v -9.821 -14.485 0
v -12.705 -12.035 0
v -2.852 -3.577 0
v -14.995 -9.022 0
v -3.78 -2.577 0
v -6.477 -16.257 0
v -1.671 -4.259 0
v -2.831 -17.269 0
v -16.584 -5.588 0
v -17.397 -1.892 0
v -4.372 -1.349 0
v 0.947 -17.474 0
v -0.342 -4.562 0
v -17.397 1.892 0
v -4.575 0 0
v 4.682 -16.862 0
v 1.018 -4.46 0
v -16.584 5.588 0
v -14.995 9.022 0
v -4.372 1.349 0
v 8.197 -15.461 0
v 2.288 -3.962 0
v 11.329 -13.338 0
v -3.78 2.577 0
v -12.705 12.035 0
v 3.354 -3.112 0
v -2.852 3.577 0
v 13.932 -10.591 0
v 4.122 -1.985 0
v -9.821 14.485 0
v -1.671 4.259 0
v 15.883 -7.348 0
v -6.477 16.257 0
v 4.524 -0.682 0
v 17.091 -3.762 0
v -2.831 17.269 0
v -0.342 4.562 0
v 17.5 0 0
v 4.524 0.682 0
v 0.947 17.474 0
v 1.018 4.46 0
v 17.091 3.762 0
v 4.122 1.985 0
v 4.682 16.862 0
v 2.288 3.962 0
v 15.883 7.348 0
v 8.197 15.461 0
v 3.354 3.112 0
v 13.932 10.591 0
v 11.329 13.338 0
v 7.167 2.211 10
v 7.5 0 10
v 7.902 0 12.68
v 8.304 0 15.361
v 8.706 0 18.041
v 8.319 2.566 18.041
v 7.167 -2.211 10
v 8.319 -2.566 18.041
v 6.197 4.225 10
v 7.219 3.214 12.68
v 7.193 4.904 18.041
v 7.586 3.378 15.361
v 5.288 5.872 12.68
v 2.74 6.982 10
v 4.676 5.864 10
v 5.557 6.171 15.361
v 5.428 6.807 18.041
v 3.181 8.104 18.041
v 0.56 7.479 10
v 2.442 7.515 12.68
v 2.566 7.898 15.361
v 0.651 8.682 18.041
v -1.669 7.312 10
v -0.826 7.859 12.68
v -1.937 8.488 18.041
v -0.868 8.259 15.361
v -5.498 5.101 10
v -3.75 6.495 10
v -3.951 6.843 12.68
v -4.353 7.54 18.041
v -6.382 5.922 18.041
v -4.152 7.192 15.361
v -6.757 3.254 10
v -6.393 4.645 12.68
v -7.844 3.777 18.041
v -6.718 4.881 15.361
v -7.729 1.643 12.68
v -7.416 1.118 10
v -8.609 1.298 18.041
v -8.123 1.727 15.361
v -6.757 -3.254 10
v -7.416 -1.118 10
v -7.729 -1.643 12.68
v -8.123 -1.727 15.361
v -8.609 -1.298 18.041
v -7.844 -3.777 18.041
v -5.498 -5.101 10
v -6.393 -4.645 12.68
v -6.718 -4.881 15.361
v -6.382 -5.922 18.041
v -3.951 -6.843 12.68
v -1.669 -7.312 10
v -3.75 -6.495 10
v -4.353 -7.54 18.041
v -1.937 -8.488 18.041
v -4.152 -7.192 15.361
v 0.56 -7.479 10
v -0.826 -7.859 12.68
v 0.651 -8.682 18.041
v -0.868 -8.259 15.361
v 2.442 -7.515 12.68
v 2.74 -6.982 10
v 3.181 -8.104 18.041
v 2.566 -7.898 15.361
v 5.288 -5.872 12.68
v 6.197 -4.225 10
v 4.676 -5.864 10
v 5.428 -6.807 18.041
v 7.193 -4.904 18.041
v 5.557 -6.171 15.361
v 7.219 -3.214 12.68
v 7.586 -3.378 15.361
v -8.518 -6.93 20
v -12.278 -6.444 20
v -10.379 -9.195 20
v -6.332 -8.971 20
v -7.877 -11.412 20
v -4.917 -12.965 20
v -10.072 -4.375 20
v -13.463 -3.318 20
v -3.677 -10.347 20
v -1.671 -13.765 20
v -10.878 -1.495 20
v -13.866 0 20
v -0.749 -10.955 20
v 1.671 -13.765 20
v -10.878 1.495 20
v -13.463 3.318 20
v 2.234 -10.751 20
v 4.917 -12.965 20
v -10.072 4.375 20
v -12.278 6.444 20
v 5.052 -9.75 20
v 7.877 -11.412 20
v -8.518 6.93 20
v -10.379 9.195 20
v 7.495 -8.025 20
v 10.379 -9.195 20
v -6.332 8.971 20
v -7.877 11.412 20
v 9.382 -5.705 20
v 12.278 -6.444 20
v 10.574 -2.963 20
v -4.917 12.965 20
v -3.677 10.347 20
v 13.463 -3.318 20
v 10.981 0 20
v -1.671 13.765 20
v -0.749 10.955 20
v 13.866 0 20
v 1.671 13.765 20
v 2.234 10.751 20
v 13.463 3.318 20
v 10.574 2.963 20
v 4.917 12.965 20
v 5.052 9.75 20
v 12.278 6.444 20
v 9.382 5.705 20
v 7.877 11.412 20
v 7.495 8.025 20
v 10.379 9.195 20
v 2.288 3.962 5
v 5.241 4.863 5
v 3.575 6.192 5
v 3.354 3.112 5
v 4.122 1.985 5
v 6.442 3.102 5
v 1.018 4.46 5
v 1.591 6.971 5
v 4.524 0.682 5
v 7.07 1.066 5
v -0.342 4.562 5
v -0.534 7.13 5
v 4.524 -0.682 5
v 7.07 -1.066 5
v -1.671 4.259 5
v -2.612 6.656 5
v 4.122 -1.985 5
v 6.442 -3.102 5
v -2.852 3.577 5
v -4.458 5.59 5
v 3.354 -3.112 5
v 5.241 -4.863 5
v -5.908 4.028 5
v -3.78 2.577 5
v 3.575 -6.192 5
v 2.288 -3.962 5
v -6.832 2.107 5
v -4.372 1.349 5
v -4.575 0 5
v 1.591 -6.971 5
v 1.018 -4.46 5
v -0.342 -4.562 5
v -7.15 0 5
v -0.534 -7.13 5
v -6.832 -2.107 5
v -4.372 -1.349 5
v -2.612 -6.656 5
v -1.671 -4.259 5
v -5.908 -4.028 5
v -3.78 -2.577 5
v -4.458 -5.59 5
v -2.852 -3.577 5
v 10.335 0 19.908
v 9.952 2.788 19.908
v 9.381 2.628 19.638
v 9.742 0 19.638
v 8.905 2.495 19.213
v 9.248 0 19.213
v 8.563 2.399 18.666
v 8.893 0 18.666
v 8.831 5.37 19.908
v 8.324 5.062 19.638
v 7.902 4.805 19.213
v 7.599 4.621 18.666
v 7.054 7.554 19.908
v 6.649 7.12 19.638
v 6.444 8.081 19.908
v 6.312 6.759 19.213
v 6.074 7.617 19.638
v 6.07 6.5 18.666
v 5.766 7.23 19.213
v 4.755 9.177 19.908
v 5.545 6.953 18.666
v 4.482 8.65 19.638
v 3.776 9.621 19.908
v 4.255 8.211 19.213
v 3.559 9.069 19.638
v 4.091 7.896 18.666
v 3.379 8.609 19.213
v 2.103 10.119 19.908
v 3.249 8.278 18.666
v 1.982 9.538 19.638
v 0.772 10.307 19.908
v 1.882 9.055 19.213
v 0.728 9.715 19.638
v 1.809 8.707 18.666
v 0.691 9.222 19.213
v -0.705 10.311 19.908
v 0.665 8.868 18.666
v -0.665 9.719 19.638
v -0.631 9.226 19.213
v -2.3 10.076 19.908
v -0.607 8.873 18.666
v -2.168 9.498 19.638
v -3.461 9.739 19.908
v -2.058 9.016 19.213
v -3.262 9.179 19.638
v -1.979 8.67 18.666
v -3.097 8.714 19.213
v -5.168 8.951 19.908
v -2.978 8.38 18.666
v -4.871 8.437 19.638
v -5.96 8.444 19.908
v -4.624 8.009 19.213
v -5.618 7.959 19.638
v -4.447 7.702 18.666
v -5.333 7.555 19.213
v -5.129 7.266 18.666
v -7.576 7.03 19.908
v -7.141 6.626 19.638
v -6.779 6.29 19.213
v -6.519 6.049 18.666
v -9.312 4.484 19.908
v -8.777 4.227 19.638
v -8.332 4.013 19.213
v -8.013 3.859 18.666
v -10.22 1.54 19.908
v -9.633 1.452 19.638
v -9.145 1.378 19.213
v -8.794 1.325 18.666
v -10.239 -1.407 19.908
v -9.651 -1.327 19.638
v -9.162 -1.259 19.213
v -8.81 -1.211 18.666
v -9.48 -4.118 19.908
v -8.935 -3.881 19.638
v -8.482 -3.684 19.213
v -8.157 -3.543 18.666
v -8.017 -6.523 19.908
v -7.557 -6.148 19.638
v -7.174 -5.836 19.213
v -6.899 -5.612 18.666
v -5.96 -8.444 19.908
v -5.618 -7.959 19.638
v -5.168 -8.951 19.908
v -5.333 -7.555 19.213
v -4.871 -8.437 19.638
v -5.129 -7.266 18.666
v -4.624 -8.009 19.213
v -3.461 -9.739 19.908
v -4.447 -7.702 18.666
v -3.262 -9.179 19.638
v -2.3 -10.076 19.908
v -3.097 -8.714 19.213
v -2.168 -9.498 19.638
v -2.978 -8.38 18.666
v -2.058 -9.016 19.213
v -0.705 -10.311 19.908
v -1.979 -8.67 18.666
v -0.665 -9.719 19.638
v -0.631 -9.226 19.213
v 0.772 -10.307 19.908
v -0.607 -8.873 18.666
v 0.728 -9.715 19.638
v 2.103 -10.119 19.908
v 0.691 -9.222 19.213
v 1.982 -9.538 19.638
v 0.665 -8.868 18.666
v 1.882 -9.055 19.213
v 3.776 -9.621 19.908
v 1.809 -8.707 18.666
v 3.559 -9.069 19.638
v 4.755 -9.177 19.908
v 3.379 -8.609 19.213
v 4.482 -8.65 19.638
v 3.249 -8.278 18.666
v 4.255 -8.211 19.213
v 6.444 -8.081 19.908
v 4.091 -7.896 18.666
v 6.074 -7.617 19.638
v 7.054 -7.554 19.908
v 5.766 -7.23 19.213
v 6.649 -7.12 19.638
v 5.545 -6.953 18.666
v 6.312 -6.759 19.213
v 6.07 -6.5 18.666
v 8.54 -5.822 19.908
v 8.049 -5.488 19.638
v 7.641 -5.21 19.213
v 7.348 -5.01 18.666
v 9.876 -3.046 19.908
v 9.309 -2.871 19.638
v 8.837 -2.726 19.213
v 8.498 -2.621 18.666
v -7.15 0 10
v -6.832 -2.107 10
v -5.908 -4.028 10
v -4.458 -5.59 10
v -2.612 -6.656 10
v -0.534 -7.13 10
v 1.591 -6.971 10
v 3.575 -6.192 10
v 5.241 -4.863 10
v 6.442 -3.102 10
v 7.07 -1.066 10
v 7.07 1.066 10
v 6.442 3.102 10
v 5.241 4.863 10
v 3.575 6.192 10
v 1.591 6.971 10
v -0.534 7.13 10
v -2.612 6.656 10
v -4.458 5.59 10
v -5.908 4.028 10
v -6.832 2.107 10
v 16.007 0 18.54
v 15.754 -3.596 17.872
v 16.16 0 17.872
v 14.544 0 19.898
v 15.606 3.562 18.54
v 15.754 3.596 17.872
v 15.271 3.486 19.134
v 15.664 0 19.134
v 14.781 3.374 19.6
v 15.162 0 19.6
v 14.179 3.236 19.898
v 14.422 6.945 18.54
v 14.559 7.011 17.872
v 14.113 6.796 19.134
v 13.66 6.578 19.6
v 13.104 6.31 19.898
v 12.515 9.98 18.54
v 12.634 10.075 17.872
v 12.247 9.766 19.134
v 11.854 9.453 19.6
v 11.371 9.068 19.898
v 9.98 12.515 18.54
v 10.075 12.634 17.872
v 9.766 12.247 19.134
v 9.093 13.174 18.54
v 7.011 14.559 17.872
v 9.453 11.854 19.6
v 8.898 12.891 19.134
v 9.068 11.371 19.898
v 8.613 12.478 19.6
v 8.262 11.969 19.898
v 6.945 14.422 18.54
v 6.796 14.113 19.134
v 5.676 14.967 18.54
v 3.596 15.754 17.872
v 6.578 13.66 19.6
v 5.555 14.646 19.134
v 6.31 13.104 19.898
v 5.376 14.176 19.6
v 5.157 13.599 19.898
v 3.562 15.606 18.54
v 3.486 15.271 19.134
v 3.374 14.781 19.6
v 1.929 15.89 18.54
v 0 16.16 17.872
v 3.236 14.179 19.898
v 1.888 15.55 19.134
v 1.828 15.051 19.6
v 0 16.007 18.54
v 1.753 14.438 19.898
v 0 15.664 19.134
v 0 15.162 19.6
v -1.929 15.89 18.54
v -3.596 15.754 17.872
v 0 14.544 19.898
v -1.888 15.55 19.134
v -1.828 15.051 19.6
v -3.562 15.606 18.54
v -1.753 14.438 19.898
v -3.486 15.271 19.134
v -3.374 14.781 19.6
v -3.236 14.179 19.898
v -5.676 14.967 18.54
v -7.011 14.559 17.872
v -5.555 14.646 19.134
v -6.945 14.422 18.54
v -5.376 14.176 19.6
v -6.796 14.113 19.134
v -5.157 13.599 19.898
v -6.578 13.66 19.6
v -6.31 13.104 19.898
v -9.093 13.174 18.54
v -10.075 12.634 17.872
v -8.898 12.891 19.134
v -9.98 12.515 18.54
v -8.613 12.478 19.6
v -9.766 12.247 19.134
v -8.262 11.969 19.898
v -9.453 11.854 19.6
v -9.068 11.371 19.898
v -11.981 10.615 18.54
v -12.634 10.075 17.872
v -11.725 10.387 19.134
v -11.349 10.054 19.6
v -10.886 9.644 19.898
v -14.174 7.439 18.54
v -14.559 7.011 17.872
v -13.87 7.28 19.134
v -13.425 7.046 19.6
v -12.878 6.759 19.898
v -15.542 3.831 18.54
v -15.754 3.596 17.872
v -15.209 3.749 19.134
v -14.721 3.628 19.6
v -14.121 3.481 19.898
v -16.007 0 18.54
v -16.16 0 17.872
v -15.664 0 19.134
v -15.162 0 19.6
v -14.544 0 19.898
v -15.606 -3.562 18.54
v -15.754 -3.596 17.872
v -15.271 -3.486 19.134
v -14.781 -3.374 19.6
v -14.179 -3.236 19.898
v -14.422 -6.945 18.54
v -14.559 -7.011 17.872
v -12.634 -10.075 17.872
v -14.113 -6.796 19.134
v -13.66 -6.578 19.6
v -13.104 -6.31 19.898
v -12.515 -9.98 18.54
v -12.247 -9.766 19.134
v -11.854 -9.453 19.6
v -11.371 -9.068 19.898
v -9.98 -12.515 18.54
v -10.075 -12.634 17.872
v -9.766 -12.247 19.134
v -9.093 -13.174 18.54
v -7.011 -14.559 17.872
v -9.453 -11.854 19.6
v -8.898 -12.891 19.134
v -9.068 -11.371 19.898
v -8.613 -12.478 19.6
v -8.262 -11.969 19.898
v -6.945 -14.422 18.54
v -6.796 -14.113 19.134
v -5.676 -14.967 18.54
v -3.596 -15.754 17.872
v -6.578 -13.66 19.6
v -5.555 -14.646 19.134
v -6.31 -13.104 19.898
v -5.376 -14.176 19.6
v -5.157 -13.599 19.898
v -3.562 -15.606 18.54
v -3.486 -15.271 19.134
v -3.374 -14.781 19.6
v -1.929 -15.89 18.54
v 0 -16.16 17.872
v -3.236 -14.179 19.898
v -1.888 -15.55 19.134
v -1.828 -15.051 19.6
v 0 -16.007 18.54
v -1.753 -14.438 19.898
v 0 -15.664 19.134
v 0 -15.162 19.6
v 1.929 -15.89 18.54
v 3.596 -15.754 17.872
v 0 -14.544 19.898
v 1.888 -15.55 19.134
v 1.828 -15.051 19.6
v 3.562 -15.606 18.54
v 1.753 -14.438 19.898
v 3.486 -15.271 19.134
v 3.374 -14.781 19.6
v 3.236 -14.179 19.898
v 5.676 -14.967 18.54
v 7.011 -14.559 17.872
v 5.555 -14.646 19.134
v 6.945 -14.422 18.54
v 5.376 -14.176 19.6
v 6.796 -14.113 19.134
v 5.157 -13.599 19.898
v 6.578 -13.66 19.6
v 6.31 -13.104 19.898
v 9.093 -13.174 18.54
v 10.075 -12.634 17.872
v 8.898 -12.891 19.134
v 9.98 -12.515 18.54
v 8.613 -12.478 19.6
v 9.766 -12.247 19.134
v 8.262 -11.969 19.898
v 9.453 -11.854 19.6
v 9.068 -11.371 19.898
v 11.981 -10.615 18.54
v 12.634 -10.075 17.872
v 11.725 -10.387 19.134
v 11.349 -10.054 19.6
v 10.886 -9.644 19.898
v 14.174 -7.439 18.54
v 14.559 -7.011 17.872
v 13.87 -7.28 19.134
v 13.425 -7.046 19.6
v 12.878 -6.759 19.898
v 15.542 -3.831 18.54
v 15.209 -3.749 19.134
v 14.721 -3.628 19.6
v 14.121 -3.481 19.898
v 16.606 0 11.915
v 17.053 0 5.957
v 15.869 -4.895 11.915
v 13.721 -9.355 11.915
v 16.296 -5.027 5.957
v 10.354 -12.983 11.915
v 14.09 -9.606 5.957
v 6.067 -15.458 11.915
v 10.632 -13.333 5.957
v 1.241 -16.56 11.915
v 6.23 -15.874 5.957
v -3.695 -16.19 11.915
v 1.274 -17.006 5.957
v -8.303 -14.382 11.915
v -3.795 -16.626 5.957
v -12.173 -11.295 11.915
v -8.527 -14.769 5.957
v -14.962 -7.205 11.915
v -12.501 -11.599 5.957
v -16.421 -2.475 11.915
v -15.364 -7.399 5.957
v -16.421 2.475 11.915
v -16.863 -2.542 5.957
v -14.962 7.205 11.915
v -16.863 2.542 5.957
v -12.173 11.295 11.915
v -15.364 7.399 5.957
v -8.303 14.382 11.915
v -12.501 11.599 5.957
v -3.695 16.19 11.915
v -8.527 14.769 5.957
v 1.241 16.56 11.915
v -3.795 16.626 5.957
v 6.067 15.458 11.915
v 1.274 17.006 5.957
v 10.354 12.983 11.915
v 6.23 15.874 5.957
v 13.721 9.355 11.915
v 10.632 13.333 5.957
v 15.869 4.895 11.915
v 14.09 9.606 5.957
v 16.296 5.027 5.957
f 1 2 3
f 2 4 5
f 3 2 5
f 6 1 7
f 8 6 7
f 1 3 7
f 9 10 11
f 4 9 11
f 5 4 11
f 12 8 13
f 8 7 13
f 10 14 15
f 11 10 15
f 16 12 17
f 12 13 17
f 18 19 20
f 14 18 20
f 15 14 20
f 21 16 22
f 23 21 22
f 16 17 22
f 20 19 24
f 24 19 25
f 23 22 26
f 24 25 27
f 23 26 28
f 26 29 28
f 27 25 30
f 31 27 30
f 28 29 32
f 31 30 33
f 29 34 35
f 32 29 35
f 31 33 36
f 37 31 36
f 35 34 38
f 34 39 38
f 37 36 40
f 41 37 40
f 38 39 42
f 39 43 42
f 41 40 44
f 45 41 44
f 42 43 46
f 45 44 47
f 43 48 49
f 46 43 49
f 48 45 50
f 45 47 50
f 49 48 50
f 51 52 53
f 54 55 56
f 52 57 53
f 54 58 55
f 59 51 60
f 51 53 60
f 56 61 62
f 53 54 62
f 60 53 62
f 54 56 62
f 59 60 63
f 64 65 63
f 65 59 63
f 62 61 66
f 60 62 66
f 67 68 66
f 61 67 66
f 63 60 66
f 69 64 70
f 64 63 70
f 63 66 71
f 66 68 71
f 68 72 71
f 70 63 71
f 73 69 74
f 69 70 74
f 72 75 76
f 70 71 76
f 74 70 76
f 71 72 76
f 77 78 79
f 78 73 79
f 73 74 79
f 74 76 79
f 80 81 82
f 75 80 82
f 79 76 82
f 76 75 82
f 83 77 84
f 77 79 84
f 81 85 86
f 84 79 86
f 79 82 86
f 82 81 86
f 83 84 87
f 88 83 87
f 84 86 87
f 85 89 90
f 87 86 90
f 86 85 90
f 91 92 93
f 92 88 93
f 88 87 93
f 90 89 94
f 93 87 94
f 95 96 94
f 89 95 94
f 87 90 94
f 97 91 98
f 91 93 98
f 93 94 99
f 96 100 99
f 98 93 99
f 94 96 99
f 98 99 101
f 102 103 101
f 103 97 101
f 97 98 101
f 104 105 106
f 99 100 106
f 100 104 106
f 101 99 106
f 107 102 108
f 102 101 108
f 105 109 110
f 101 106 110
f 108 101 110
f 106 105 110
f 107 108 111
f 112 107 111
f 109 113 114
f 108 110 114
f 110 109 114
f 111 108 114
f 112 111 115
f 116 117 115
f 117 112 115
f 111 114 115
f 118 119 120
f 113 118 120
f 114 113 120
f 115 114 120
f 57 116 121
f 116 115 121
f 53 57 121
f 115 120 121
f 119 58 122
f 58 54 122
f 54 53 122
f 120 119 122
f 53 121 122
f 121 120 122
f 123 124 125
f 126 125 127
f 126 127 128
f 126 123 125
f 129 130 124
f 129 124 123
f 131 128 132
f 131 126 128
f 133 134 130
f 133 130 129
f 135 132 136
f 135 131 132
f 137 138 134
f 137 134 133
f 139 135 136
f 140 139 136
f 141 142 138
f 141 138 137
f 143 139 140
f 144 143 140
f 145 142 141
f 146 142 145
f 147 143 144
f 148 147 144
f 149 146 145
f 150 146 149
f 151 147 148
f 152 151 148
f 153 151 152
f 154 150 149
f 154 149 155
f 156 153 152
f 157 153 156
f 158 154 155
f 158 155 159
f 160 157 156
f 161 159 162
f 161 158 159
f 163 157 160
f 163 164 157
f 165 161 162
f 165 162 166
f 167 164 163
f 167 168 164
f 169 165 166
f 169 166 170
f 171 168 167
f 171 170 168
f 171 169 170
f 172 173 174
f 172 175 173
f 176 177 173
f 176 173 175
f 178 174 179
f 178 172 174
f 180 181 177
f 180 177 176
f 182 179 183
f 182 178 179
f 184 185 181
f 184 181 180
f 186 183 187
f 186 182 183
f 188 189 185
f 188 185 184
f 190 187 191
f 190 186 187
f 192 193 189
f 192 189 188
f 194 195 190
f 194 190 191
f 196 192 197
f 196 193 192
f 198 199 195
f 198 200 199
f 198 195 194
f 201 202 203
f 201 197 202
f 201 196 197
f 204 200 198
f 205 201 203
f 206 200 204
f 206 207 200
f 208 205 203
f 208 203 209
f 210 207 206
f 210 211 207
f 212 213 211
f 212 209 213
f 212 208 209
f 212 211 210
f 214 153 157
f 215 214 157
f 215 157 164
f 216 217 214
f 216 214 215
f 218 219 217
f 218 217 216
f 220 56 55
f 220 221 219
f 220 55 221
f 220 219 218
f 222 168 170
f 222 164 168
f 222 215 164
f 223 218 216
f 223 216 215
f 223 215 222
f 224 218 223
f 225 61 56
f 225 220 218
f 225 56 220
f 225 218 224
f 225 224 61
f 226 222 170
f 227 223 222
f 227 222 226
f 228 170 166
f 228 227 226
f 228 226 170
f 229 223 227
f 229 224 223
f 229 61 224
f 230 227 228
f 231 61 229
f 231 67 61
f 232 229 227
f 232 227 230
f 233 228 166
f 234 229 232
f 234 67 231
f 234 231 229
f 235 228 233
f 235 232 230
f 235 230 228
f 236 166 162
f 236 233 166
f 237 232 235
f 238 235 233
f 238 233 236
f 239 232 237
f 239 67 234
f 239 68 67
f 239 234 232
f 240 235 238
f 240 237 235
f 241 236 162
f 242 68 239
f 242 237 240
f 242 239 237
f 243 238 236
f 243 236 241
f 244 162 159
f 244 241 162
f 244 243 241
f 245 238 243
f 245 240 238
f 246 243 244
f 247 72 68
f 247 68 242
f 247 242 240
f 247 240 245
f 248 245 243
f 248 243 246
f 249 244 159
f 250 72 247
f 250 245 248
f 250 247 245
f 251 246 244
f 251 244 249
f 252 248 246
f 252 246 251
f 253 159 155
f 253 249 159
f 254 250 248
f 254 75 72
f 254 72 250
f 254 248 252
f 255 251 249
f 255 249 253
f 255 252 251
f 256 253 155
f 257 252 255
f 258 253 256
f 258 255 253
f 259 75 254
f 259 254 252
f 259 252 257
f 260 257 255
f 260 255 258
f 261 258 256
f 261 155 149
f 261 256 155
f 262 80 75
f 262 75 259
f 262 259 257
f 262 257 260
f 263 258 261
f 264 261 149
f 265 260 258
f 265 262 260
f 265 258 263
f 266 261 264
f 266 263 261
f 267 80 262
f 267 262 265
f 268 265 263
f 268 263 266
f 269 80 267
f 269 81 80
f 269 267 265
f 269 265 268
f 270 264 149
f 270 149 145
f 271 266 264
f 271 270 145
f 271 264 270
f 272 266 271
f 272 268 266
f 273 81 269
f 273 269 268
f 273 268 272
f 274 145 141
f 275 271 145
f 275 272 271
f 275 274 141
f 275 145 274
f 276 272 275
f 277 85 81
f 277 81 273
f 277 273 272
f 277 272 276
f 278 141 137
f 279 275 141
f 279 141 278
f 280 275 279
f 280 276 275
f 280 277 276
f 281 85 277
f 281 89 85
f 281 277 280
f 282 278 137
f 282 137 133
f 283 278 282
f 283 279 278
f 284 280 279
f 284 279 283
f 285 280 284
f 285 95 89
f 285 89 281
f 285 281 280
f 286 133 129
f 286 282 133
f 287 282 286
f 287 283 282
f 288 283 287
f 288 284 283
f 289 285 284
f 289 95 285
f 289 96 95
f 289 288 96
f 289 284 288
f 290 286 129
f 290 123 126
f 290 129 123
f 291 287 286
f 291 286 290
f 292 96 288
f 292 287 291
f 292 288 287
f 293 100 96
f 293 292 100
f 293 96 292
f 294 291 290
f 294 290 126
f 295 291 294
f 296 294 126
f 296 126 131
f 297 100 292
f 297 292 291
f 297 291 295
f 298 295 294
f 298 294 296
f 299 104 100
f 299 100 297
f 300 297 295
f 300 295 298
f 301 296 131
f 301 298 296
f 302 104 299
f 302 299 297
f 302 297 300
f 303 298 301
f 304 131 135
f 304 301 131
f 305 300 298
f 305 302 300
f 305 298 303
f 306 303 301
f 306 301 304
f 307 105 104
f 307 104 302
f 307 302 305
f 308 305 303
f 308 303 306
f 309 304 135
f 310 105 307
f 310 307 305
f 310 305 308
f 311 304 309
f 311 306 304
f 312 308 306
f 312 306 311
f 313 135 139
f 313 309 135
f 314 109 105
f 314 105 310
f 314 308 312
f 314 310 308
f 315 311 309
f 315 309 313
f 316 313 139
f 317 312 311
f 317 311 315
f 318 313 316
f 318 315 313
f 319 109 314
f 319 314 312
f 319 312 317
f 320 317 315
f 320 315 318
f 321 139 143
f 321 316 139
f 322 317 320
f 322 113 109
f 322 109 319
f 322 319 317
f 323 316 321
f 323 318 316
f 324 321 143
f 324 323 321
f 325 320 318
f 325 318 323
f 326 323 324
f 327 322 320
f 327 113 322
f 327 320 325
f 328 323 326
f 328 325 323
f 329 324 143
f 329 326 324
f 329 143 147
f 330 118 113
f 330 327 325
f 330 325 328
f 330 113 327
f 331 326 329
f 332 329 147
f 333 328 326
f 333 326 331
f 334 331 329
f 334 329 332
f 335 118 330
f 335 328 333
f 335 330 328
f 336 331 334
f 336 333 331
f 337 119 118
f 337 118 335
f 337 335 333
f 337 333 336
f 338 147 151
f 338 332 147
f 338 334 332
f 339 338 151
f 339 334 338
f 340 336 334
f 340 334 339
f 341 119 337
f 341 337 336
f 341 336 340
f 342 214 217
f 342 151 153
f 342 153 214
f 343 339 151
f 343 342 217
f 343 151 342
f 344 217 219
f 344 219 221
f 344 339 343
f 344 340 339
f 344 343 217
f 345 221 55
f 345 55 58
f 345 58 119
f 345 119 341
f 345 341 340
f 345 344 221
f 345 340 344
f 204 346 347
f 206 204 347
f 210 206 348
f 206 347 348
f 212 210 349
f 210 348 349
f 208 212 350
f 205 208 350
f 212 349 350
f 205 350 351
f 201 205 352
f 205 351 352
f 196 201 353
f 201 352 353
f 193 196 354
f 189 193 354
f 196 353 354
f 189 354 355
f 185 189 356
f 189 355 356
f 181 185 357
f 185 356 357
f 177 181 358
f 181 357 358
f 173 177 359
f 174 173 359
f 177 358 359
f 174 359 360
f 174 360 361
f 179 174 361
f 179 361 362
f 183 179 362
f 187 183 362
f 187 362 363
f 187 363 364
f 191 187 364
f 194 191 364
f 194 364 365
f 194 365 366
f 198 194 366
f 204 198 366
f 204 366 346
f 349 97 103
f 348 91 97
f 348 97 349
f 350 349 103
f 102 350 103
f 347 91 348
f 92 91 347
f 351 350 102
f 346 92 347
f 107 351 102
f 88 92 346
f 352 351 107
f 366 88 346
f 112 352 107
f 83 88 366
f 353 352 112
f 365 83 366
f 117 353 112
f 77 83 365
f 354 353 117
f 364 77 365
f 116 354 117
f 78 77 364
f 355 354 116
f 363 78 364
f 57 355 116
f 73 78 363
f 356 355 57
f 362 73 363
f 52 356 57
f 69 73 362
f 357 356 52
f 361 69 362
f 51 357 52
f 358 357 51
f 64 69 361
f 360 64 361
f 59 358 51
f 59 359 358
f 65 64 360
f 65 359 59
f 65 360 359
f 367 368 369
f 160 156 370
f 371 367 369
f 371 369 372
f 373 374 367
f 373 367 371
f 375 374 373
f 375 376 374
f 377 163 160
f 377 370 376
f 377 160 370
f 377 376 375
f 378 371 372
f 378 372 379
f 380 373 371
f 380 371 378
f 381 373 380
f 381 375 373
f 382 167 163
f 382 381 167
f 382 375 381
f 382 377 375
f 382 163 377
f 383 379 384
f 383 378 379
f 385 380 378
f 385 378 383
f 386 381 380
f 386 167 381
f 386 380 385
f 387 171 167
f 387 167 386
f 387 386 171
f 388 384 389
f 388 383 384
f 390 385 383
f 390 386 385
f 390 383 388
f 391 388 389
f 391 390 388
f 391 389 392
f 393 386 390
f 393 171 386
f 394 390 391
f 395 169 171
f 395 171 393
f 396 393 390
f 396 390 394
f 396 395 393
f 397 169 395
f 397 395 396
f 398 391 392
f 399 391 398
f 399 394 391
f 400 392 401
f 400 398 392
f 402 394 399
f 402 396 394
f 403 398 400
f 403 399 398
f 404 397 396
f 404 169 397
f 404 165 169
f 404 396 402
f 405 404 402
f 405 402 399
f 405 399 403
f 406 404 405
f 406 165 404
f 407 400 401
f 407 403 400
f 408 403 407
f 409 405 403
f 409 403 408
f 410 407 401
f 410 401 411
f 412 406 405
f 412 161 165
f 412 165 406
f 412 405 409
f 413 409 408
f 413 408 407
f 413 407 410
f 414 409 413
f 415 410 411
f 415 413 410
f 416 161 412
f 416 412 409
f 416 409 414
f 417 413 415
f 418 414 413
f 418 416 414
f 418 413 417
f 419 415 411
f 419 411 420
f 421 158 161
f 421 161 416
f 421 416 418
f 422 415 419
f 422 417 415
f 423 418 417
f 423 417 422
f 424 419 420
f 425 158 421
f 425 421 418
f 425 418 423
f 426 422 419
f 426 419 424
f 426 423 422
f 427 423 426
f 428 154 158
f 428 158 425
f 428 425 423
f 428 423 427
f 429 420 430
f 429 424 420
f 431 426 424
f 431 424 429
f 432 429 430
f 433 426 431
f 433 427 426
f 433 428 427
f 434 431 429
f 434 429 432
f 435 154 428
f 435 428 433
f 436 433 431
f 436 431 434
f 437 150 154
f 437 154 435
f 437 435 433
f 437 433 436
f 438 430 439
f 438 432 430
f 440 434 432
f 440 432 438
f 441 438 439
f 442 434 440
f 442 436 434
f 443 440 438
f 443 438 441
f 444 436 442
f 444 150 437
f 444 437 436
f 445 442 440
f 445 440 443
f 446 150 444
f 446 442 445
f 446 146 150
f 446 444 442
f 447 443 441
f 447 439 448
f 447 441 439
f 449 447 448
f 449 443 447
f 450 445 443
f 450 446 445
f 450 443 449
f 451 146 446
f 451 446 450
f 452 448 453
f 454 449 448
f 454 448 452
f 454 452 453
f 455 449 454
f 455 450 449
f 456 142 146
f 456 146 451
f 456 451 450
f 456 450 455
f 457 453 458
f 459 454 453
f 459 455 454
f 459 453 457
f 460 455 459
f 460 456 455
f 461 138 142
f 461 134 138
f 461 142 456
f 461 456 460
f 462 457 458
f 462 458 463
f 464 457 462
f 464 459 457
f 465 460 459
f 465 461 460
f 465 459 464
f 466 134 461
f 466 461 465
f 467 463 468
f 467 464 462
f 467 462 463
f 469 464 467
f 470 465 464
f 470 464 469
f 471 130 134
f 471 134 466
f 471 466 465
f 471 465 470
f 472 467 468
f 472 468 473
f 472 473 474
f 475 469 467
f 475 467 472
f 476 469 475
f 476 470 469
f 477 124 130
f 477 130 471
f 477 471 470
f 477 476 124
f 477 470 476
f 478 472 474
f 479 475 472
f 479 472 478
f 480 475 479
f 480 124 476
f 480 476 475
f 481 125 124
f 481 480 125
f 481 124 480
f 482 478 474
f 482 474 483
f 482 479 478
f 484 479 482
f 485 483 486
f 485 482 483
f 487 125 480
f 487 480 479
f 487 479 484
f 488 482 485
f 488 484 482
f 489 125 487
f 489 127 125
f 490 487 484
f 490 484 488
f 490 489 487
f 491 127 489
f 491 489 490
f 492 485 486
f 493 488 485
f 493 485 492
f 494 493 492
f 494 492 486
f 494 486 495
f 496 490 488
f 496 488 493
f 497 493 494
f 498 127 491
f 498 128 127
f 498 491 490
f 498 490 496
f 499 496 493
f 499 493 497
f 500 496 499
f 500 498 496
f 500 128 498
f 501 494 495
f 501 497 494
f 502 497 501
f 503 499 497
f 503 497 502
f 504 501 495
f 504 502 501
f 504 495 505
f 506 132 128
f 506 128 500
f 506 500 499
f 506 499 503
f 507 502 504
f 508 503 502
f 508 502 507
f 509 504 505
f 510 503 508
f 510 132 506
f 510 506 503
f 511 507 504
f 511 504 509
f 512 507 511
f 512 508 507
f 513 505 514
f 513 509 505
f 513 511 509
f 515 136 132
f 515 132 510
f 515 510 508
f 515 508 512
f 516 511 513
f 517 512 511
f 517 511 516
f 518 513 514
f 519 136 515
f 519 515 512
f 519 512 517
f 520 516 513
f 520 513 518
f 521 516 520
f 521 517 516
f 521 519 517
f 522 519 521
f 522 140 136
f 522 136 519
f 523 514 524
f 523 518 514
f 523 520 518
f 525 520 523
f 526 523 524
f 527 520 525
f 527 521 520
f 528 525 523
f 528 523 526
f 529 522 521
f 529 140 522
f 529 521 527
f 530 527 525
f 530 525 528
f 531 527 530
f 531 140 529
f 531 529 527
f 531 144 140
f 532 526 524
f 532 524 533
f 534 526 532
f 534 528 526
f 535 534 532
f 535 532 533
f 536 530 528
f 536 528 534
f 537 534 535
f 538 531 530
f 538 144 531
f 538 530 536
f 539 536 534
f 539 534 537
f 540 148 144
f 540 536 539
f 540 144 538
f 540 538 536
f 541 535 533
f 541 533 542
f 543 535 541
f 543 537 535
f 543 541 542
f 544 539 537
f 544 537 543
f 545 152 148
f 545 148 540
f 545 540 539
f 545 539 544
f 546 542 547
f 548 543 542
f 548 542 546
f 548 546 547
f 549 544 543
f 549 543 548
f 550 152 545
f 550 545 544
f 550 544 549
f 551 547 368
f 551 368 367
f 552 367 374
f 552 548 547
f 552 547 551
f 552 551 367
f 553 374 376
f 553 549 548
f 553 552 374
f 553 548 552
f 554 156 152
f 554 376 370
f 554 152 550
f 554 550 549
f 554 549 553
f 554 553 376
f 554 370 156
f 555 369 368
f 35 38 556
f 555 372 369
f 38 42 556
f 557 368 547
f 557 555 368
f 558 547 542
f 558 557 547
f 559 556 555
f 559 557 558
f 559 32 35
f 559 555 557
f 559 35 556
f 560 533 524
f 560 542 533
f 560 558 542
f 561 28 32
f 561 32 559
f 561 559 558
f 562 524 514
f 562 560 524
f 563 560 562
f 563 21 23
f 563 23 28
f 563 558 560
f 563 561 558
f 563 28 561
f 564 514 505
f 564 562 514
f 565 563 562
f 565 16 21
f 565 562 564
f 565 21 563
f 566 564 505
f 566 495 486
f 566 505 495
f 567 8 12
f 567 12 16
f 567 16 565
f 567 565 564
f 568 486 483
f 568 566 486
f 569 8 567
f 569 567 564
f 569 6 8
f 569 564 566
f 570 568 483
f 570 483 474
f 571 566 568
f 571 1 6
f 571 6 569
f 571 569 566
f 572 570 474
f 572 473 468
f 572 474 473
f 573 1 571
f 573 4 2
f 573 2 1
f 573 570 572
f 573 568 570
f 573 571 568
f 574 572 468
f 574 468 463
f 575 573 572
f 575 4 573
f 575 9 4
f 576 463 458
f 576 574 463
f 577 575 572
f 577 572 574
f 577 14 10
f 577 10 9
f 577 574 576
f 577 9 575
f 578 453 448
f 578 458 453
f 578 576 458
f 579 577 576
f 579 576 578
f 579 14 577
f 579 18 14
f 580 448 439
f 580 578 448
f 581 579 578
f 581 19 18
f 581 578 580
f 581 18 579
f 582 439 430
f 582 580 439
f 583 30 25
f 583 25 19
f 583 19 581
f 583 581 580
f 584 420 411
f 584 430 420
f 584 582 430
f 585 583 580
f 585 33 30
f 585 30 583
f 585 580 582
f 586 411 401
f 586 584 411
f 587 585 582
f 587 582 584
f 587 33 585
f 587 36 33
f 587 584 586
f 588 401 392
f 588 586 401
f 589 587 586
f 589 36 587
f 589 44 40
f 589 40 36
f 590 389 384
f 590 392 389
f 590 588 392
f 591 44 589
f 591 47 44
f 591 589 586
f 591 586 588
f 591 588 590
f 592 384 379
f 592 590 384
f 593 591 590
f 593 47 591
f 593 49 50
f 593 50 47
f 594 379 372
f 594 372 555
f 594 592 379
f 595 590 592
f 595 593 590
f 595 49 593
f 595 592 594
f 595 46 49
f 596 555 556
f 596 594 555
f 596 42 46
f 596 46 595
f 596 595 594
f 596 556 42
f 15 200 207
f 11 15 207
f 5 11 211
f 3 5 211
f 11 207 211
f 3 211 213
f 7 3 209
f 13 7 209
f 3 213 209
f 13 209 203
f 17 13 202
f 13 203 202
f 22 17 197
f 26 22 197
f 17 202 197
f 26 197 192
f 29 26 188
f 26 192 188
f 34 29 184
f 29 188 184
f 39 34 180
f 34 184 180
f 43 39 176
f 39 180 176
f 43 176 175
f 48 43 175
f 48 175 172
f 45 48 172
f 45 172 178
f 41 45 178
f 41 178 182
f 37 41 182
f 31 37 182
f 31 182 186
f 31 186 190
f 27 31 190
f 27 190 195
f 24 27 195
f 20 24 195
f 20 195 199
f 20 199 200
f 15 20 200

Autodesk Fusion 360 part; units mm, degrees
sketch "Sketch1" plane through (0, 0, 0) normal (0, 0, 1) x (1, 0, 0)
  circle A0 centre (0, 0) radius 17.5
  dimension "d1" = 35
ref_plane "WorkPlane1" through (0, 0, 20) normal (0, 0, 1) x (1, 0, 0)
sketch "Sketch2" plane through (0, 0, 20) normal (0, 0, 1) x (1, 0, 0)
  circle A0 centre (0, 0) radius 16
  dimension "d3" = 32
loft "Loft1" add profiles "Sketch1", "Sketch2" section 1 section 2
ref_plane "WorkPlane2" through (0, 0, 10) normal (0, 0, 1) x (1, 0, 0)
sketch "Sketch3" plane through (0, 0, 10) normal (0, 0, 1) x (1, 0, 0)
  circle A0 centre (0, 0) radius 7.5
  dimension "d5" = 15
sketch "Sketch4" plane through (0, 0, 20) normal (0, 0, 1) x (-1, 0, 0)
  circle A0 centre (0, 0) radius 16
  circle A1 centre (0, 0) radius 9
  dimension "d6" = 18
loft "Loft2" cut profiles "Sketch3", "Sketch4" section 1 section 2 contours A1
fillet "Fillet1" radius 2.3 2 edges at (8.3909, -3.2545, 20) (-14.9172, 5.7858, 20)
sketch "Sketch5" plane through (0, 0, 10) normal (0, 0, 1) x (-1, 0, 0)
  circle A0 centre (0, 0) radius 7.5
  circle A1 centre (0, 0) radius 4.575
  dimension "d9" = 9.15
extrude "Extrude1" cut sketch "Sketch5" against normal blind 10 contours A1
sketch "Sketch6" plane through (0, 0, 10) normal (0, 0, 1) x (-1, 0, 0)
  circle A0 centre (0, 0) radius 4.575
  circle A1 centre (0, 0) radius 7.5
  circle A2 centre (0, 0) radius 7.15
  dimension "d12" = 14.3
extrude "Extrude2" cut sketch "Sketch6" against normal blind 5 contours A2
equation "d4 = -20 mm + 10 mm"
